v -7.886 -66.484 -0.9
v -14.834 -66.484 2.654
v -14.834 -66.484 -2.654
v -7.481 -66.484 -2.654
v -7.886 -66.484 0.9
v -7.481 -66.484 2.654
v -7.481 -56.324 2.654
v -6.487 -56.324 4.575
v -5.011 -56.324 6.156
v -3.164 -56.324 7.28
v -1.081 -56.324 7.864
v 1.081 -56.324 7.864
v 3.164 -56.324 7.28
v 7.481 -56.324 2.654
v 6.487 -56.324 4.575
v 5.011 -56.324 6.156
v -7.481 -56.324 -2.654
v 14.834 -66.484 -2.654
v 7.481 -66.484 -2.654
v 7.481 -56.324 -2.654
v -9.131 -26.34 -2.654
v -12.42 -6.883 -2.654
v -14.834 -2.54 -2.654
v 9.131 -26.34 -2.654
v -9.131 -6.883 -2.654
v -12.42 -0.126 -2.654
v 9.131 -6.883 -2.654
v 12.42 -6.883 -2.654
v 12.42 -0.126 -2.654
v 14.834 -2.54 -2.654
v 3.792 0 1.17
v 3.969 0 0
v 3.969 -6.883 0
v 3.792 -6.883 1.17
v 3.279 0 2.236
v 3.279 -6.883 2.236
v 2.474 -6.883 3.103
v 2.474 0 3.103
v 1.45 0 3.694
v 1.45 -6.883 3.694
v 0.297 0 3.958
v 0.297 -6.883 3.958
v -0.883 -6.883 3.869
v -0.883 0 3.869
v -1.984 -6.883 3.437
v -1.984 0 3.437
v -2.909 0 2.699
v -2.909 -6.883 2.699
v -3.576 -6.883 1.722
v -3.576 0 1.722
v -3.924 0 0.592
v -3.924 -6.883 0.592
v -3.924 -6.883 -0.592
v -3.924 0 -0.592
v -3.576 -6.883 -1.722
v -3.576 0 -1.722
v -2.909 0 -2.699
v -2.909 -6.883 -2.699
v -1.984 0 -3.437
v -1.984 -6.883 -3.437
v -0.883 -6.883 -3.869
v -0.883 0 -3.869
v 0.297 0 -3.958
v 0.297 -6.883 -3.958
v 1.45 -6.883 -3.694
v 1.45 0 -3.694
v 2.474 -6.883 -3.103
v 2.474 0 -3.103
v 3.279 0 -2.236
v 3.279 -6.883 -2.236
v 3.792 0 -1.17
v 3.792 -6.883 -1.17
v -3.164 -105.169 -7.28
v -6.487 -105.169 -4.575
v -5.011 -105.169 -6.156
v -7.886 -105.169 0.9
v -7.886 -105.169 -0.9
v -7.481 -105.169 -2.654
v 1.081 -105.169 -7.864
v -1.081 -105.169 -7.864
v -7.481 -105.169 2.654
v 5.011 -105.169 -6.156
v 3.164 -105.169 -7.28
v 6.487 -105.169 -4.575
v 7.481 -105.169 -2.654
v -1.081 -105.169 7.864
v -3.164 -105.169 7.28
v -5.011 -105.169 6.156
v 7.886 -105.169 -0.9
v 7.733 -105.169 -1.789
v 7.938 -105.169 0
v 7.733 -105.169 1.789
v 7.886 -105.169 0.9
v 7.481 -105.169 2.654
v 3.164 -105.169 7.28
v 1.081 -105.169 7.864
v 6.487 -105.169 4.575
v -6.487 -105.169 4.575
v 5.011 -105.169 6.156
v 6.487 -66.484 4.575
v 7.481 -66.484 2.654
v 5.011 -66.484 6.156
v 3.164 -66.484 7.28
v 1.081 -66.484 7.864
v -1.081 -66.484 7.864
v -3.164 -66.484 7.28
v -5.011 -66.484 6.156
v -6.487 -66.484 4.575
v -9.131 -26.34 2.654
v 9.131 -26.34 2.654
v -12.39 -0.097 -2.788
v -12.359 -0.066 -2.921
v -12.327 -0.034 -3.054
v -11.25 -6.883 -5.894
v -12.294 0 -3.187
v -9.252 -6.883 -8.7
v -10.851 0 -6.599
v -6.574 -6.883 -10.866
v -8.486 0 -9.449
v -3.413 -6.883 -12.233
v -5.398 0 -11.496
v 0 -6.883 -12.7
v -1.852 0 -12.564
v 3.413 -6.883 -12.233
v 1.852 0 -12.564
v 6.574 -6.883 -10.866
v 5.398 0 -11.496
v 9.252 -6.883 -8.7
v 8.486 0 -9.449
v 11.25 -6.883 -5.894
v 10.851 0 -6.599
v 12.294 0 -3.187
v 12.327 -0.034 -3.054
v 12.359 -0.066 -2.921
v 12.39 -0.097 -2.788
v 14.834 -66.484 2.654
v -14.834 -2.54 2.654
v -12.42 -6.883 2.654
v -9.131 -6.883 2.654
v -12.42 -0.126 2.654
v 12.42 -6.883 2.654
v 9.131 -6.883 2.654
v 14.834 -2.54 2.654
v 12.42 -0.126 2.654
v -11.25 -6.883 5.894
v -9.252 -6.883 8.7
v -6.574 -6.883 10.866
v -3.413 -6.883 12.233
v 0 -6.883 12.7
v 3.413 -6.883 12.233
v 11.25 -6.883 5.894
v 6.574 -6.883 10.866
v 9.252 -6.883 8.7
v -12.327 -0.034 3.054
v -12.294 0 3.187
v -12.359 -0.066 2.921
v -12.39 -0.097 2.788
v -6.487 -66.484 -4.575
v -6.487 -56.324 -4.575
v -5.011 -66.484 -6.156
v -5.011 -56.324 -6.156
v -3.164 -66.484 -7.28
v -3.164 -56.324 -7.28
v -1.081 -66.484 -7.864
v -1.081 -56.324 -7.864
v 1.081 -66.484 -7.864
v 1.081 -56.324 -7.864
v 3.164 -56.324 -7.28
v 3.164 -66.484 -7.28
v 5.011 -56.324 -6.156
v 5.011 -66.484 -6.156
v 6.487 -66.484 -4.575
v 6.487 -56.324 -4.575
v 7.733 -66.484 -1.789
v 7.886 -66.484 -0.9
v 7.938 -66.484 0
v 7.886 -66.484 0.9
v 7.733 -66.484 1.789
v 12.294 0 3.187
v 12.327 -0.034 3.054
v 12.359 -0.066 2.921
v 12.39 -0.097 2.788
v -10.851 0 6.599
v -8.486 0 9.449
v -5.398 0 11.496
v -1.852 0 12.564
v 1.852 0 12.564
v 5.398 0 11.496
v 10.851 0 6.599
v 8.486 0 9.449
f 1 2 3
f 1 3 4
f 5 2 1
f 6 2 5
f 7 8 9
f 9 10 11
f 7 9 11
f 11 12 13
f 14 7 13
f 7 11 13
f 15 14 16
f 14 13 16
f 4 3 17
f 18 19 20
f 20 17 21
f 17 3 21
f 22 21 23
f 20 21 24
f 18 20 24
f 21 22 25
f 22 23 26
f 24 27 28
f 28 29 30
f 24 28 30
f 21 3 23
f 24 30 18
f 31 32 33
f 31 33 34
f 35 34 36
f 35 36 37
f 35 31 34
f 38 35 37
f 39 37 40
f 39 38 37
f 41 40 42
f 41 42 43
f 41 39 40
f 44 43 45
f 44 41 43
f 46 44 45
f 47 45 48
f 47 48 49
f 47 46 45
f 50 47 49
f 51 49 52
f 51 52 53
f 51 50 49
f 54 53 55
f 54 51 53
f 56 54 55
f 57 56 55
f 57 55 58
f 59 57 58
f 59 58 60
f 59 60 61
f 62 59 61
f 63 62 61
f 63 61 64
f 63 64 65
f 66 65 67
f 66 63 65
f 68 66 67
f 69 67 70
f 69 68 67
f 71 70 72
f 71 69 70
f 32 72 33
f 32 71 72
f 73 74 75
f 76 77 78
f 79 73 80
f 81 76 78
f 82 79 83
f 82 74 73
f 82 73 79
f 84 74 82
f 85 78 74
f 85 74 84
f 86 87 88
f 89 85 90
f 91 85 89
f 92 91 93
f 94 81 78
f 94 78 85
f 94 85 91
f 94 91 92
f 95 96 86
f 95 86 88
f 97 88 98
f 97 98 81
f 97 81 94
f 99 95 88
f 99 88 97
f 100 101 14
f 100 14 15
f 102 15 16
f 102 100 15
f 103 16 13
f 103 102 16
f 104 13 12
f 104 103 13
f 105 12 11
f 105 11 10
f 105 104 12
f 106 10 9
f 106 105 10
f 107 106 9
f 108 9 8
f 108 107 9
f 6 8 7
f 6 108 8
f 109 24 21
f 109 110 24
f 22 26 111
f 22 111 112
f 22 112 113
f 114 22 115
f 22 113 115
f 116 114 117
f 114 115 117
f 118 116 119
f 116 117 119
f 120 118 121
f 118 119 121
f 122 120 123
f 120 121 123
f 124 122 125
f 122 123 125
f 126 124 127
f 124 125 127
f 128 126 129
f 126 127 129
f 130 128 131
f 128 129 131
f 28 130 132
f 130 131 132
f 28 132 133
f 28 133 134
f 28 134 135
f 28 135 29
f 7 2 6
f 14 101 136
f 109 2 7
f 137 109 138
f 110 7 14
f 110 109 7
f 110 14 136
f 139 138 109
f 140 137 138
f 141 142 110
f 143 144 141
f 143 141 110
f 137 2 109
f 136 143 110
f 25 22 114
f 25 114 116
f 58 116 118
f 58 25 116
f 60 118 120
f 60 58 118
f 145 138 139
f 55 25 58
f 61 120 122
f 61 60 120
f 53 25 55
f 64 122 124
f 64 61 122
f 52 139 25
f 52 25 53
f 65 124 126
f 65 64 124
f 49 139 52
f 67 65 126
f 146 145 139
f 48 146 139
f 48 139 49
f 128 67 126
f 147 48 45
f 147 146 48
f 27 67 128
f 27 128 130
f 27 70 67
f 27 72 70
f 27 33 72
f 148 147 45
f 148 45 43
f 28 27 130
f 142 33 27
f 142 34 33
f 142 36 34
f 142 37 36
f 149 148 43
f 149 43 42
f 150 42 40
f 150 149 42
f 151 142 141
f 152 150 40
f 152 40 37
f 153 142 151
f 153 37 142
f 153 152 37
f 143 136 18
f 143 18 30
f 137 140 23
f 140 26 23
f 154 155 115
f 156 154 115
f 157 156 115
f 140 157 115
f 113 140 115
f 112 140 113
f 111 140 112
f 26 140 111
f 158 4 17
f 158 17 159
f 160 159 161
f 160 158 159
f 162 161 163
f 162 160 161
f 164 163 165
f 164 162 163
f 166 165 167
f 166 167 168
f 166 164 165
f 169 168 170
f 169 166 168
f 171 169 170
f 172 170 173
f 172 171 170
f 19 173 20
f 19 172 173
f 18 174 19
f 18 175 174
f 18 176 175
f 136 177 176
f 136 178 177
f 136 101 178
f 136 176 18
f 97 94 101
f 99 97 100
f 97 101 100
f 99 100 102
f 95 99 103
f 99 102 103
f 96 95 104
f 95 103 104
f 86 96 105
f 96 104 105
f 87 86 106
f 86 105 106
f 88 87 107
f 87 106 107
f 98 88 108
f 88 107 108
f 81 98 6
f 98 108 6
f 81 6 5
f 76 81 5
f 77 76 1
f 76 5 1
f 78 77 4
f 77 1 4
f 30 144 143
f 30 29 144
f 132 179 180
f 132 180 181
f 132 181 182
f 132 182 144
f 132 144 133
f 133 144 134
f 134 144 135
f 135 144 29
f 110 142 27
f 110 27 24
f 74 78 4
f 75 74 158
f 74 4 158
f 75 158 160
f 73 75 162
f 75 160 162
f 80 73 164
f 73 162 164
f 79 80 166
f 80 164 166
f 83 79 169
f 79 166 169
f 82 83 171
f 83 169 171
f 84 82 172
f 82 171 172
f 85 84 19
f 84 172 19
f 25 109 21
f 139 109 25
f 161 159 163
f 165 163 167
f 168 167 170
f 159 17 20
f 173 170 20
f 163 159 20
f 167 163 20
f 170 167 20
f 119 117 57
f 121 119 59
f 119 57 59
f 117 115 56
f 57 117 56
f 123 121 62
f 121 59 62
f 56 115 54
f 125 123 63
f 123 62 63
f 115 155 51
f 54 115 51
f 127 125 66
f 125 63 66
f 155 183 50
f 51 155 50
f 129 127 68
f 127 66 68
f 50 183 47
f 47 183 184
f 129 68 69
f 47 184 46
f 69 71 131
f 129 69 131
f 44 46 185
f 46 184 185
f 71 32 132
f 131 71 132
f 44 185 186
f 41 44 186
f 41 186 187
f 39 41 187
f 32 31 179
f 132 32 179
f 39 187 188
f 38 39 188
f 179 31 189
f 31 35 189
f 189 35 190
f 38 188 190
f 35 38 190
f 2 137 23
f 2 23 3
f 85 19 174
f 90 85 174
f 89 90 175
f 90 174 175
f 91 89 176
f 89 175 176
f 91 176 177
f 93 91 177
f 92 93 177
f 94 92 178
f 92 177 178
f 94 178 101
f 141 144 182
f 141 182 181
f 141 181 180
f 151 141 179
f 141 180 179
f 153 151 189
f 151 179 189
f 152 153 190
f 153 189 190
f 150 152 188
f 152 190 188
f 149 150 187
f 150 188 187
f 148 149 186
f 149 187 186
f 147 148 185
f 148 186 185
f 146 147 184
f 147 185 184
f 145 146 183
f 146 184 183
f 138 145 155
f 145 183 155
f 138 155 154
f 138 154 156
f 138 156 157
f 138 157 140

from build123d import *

# Parameters (mm, degrees)
F0_R          = 12.7
F0_R_2        = 3.96875
F1_DEPTH      = 6.8834
F3_DEPTH      = 2.6543
F4_T1_DEPTH   = 18.3727495789
F6_DEPTH      = 38.6842
F6_DEPTH_BACK = 10.16


# Not quite as in the source:
# - a fillet or chamfer that OpenCascade refuses, or shapes differently, is made with other operations: its cross-section is extruded or revolved along the edge and cut away or added


with BuildPart() as f1:
    # F0 (on Front) → F1 (new body)
    with BuildSketch(Plane.XZ):
        Circle(F0_R)
        Circle(F0_R_2, mode=Mode.SUBTRACT)
    extrude(amount=F1_DEPTH)

    # F2 (on Top) → F3 (join, symmetric)
    with BuildSketch(Plane.XY):
        Polygon((-9.1313, 0), (-14.8336, 0), (-14.8336, -66.4845), (14.8336, -66.4845), (14.8336, 0), (9.1313, 0), (9.1313, -26.3398), (-9.1313, -26.3398), align=None)
    extrude(amount=F3_DEPTH, both=True)

    # F4: chamfer of 2.54 on 2 edges, made by hand

    # F4_s2 → F4_t1 (cut)
    with BuildSketch(Plane.XY.offset(-9.1863747894)):
        Polygon((12.2936, 0), (14.8336, -2.54), (14.8336, 0), align=None)
        Polygon((-12.2936, 0), (-14.8336, -2.54), (-14.8336, 0), align=None)
    extrude(amount=F4_T1_DEPTH, mode=Mode.SUBTRACT)

    # F5 (on face) → F6 (join, two sides)
    with BuildSketch(Plane.XZ.offset(66.4845)) as f6_sk:
        with BuildLine():
            ThreePointArc((-7.4805479585, -2.6543), (0, -7.9375), (7.4805479585, -2.6543))
            Line((7.4805479585, -2.6543), (-7.4805479585, -2.6543))
        make_face()
        with BuildLine():
            ThreePointArc((7.4805479585, -2.6543), (7.8224278735, -1.3466730912), (7.9375, 0))
            ThreePointArc((7.9375, 0), (7.8224278735, 1.3466730912), (7.4805479585, 2.6543))
            Line((7.4805479585, 2.6543), (-7.4805479585, 2.6543))
            ThreePointArc((-7.4805479585, 2.6543), (-7.9375, 0), (-7.4805479585, -2.6543))
            Line((-7.4805479585, -2.6543), (7.4805479585, -2.6543))
        make_face()
        with BuildLine():
            Line((-7.4805479585, 2.6543), (7.4805479585, 2.6543))
            ThreePointArc((7.4805479585, 2.6543), (0, 7.9375), (-7.4805479585, 2.6543))
        make_face()
    extrude(amount=F6_DEPTH)
    extrude(f6_sk.sketch, amount=-F6_DEPTH_BACK)


solid = f1.part
